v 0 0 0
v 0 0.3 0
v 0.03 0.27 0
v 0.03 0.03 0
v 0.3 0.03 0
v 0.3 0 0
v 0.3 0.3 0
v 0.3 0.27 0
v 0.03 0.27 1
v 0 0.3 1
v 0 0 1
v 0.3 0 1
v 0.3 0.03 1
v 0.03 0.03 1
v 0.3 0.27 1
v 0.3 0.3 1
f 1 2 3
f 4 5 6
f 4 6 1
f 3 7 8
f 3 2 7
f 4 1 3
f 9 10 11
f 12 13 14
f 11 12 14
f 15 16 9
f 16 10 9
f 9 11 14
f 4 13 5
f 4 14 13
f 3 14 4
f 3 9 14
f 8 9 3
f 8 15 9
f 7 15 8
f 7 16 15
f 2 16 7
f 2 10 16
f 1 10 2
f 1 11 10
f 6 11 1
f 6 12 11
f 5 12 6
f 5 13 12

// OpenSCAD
// Nicolì Angelo 2024 - THIS CODE IS LICENSED AS GPL-2.0

module Beam_C(){
scale([0.1,0.1,0.1])
    color("#CCCCCC"){
        linear_extrude(height = 10){
        polygon(points =[[0,0],[3,0],[3,0.3],[0.3,0.3],[0.3,2.7],[3,2.7],[3,3],[0,3]]);
            }
    }
}

Beam_C();
